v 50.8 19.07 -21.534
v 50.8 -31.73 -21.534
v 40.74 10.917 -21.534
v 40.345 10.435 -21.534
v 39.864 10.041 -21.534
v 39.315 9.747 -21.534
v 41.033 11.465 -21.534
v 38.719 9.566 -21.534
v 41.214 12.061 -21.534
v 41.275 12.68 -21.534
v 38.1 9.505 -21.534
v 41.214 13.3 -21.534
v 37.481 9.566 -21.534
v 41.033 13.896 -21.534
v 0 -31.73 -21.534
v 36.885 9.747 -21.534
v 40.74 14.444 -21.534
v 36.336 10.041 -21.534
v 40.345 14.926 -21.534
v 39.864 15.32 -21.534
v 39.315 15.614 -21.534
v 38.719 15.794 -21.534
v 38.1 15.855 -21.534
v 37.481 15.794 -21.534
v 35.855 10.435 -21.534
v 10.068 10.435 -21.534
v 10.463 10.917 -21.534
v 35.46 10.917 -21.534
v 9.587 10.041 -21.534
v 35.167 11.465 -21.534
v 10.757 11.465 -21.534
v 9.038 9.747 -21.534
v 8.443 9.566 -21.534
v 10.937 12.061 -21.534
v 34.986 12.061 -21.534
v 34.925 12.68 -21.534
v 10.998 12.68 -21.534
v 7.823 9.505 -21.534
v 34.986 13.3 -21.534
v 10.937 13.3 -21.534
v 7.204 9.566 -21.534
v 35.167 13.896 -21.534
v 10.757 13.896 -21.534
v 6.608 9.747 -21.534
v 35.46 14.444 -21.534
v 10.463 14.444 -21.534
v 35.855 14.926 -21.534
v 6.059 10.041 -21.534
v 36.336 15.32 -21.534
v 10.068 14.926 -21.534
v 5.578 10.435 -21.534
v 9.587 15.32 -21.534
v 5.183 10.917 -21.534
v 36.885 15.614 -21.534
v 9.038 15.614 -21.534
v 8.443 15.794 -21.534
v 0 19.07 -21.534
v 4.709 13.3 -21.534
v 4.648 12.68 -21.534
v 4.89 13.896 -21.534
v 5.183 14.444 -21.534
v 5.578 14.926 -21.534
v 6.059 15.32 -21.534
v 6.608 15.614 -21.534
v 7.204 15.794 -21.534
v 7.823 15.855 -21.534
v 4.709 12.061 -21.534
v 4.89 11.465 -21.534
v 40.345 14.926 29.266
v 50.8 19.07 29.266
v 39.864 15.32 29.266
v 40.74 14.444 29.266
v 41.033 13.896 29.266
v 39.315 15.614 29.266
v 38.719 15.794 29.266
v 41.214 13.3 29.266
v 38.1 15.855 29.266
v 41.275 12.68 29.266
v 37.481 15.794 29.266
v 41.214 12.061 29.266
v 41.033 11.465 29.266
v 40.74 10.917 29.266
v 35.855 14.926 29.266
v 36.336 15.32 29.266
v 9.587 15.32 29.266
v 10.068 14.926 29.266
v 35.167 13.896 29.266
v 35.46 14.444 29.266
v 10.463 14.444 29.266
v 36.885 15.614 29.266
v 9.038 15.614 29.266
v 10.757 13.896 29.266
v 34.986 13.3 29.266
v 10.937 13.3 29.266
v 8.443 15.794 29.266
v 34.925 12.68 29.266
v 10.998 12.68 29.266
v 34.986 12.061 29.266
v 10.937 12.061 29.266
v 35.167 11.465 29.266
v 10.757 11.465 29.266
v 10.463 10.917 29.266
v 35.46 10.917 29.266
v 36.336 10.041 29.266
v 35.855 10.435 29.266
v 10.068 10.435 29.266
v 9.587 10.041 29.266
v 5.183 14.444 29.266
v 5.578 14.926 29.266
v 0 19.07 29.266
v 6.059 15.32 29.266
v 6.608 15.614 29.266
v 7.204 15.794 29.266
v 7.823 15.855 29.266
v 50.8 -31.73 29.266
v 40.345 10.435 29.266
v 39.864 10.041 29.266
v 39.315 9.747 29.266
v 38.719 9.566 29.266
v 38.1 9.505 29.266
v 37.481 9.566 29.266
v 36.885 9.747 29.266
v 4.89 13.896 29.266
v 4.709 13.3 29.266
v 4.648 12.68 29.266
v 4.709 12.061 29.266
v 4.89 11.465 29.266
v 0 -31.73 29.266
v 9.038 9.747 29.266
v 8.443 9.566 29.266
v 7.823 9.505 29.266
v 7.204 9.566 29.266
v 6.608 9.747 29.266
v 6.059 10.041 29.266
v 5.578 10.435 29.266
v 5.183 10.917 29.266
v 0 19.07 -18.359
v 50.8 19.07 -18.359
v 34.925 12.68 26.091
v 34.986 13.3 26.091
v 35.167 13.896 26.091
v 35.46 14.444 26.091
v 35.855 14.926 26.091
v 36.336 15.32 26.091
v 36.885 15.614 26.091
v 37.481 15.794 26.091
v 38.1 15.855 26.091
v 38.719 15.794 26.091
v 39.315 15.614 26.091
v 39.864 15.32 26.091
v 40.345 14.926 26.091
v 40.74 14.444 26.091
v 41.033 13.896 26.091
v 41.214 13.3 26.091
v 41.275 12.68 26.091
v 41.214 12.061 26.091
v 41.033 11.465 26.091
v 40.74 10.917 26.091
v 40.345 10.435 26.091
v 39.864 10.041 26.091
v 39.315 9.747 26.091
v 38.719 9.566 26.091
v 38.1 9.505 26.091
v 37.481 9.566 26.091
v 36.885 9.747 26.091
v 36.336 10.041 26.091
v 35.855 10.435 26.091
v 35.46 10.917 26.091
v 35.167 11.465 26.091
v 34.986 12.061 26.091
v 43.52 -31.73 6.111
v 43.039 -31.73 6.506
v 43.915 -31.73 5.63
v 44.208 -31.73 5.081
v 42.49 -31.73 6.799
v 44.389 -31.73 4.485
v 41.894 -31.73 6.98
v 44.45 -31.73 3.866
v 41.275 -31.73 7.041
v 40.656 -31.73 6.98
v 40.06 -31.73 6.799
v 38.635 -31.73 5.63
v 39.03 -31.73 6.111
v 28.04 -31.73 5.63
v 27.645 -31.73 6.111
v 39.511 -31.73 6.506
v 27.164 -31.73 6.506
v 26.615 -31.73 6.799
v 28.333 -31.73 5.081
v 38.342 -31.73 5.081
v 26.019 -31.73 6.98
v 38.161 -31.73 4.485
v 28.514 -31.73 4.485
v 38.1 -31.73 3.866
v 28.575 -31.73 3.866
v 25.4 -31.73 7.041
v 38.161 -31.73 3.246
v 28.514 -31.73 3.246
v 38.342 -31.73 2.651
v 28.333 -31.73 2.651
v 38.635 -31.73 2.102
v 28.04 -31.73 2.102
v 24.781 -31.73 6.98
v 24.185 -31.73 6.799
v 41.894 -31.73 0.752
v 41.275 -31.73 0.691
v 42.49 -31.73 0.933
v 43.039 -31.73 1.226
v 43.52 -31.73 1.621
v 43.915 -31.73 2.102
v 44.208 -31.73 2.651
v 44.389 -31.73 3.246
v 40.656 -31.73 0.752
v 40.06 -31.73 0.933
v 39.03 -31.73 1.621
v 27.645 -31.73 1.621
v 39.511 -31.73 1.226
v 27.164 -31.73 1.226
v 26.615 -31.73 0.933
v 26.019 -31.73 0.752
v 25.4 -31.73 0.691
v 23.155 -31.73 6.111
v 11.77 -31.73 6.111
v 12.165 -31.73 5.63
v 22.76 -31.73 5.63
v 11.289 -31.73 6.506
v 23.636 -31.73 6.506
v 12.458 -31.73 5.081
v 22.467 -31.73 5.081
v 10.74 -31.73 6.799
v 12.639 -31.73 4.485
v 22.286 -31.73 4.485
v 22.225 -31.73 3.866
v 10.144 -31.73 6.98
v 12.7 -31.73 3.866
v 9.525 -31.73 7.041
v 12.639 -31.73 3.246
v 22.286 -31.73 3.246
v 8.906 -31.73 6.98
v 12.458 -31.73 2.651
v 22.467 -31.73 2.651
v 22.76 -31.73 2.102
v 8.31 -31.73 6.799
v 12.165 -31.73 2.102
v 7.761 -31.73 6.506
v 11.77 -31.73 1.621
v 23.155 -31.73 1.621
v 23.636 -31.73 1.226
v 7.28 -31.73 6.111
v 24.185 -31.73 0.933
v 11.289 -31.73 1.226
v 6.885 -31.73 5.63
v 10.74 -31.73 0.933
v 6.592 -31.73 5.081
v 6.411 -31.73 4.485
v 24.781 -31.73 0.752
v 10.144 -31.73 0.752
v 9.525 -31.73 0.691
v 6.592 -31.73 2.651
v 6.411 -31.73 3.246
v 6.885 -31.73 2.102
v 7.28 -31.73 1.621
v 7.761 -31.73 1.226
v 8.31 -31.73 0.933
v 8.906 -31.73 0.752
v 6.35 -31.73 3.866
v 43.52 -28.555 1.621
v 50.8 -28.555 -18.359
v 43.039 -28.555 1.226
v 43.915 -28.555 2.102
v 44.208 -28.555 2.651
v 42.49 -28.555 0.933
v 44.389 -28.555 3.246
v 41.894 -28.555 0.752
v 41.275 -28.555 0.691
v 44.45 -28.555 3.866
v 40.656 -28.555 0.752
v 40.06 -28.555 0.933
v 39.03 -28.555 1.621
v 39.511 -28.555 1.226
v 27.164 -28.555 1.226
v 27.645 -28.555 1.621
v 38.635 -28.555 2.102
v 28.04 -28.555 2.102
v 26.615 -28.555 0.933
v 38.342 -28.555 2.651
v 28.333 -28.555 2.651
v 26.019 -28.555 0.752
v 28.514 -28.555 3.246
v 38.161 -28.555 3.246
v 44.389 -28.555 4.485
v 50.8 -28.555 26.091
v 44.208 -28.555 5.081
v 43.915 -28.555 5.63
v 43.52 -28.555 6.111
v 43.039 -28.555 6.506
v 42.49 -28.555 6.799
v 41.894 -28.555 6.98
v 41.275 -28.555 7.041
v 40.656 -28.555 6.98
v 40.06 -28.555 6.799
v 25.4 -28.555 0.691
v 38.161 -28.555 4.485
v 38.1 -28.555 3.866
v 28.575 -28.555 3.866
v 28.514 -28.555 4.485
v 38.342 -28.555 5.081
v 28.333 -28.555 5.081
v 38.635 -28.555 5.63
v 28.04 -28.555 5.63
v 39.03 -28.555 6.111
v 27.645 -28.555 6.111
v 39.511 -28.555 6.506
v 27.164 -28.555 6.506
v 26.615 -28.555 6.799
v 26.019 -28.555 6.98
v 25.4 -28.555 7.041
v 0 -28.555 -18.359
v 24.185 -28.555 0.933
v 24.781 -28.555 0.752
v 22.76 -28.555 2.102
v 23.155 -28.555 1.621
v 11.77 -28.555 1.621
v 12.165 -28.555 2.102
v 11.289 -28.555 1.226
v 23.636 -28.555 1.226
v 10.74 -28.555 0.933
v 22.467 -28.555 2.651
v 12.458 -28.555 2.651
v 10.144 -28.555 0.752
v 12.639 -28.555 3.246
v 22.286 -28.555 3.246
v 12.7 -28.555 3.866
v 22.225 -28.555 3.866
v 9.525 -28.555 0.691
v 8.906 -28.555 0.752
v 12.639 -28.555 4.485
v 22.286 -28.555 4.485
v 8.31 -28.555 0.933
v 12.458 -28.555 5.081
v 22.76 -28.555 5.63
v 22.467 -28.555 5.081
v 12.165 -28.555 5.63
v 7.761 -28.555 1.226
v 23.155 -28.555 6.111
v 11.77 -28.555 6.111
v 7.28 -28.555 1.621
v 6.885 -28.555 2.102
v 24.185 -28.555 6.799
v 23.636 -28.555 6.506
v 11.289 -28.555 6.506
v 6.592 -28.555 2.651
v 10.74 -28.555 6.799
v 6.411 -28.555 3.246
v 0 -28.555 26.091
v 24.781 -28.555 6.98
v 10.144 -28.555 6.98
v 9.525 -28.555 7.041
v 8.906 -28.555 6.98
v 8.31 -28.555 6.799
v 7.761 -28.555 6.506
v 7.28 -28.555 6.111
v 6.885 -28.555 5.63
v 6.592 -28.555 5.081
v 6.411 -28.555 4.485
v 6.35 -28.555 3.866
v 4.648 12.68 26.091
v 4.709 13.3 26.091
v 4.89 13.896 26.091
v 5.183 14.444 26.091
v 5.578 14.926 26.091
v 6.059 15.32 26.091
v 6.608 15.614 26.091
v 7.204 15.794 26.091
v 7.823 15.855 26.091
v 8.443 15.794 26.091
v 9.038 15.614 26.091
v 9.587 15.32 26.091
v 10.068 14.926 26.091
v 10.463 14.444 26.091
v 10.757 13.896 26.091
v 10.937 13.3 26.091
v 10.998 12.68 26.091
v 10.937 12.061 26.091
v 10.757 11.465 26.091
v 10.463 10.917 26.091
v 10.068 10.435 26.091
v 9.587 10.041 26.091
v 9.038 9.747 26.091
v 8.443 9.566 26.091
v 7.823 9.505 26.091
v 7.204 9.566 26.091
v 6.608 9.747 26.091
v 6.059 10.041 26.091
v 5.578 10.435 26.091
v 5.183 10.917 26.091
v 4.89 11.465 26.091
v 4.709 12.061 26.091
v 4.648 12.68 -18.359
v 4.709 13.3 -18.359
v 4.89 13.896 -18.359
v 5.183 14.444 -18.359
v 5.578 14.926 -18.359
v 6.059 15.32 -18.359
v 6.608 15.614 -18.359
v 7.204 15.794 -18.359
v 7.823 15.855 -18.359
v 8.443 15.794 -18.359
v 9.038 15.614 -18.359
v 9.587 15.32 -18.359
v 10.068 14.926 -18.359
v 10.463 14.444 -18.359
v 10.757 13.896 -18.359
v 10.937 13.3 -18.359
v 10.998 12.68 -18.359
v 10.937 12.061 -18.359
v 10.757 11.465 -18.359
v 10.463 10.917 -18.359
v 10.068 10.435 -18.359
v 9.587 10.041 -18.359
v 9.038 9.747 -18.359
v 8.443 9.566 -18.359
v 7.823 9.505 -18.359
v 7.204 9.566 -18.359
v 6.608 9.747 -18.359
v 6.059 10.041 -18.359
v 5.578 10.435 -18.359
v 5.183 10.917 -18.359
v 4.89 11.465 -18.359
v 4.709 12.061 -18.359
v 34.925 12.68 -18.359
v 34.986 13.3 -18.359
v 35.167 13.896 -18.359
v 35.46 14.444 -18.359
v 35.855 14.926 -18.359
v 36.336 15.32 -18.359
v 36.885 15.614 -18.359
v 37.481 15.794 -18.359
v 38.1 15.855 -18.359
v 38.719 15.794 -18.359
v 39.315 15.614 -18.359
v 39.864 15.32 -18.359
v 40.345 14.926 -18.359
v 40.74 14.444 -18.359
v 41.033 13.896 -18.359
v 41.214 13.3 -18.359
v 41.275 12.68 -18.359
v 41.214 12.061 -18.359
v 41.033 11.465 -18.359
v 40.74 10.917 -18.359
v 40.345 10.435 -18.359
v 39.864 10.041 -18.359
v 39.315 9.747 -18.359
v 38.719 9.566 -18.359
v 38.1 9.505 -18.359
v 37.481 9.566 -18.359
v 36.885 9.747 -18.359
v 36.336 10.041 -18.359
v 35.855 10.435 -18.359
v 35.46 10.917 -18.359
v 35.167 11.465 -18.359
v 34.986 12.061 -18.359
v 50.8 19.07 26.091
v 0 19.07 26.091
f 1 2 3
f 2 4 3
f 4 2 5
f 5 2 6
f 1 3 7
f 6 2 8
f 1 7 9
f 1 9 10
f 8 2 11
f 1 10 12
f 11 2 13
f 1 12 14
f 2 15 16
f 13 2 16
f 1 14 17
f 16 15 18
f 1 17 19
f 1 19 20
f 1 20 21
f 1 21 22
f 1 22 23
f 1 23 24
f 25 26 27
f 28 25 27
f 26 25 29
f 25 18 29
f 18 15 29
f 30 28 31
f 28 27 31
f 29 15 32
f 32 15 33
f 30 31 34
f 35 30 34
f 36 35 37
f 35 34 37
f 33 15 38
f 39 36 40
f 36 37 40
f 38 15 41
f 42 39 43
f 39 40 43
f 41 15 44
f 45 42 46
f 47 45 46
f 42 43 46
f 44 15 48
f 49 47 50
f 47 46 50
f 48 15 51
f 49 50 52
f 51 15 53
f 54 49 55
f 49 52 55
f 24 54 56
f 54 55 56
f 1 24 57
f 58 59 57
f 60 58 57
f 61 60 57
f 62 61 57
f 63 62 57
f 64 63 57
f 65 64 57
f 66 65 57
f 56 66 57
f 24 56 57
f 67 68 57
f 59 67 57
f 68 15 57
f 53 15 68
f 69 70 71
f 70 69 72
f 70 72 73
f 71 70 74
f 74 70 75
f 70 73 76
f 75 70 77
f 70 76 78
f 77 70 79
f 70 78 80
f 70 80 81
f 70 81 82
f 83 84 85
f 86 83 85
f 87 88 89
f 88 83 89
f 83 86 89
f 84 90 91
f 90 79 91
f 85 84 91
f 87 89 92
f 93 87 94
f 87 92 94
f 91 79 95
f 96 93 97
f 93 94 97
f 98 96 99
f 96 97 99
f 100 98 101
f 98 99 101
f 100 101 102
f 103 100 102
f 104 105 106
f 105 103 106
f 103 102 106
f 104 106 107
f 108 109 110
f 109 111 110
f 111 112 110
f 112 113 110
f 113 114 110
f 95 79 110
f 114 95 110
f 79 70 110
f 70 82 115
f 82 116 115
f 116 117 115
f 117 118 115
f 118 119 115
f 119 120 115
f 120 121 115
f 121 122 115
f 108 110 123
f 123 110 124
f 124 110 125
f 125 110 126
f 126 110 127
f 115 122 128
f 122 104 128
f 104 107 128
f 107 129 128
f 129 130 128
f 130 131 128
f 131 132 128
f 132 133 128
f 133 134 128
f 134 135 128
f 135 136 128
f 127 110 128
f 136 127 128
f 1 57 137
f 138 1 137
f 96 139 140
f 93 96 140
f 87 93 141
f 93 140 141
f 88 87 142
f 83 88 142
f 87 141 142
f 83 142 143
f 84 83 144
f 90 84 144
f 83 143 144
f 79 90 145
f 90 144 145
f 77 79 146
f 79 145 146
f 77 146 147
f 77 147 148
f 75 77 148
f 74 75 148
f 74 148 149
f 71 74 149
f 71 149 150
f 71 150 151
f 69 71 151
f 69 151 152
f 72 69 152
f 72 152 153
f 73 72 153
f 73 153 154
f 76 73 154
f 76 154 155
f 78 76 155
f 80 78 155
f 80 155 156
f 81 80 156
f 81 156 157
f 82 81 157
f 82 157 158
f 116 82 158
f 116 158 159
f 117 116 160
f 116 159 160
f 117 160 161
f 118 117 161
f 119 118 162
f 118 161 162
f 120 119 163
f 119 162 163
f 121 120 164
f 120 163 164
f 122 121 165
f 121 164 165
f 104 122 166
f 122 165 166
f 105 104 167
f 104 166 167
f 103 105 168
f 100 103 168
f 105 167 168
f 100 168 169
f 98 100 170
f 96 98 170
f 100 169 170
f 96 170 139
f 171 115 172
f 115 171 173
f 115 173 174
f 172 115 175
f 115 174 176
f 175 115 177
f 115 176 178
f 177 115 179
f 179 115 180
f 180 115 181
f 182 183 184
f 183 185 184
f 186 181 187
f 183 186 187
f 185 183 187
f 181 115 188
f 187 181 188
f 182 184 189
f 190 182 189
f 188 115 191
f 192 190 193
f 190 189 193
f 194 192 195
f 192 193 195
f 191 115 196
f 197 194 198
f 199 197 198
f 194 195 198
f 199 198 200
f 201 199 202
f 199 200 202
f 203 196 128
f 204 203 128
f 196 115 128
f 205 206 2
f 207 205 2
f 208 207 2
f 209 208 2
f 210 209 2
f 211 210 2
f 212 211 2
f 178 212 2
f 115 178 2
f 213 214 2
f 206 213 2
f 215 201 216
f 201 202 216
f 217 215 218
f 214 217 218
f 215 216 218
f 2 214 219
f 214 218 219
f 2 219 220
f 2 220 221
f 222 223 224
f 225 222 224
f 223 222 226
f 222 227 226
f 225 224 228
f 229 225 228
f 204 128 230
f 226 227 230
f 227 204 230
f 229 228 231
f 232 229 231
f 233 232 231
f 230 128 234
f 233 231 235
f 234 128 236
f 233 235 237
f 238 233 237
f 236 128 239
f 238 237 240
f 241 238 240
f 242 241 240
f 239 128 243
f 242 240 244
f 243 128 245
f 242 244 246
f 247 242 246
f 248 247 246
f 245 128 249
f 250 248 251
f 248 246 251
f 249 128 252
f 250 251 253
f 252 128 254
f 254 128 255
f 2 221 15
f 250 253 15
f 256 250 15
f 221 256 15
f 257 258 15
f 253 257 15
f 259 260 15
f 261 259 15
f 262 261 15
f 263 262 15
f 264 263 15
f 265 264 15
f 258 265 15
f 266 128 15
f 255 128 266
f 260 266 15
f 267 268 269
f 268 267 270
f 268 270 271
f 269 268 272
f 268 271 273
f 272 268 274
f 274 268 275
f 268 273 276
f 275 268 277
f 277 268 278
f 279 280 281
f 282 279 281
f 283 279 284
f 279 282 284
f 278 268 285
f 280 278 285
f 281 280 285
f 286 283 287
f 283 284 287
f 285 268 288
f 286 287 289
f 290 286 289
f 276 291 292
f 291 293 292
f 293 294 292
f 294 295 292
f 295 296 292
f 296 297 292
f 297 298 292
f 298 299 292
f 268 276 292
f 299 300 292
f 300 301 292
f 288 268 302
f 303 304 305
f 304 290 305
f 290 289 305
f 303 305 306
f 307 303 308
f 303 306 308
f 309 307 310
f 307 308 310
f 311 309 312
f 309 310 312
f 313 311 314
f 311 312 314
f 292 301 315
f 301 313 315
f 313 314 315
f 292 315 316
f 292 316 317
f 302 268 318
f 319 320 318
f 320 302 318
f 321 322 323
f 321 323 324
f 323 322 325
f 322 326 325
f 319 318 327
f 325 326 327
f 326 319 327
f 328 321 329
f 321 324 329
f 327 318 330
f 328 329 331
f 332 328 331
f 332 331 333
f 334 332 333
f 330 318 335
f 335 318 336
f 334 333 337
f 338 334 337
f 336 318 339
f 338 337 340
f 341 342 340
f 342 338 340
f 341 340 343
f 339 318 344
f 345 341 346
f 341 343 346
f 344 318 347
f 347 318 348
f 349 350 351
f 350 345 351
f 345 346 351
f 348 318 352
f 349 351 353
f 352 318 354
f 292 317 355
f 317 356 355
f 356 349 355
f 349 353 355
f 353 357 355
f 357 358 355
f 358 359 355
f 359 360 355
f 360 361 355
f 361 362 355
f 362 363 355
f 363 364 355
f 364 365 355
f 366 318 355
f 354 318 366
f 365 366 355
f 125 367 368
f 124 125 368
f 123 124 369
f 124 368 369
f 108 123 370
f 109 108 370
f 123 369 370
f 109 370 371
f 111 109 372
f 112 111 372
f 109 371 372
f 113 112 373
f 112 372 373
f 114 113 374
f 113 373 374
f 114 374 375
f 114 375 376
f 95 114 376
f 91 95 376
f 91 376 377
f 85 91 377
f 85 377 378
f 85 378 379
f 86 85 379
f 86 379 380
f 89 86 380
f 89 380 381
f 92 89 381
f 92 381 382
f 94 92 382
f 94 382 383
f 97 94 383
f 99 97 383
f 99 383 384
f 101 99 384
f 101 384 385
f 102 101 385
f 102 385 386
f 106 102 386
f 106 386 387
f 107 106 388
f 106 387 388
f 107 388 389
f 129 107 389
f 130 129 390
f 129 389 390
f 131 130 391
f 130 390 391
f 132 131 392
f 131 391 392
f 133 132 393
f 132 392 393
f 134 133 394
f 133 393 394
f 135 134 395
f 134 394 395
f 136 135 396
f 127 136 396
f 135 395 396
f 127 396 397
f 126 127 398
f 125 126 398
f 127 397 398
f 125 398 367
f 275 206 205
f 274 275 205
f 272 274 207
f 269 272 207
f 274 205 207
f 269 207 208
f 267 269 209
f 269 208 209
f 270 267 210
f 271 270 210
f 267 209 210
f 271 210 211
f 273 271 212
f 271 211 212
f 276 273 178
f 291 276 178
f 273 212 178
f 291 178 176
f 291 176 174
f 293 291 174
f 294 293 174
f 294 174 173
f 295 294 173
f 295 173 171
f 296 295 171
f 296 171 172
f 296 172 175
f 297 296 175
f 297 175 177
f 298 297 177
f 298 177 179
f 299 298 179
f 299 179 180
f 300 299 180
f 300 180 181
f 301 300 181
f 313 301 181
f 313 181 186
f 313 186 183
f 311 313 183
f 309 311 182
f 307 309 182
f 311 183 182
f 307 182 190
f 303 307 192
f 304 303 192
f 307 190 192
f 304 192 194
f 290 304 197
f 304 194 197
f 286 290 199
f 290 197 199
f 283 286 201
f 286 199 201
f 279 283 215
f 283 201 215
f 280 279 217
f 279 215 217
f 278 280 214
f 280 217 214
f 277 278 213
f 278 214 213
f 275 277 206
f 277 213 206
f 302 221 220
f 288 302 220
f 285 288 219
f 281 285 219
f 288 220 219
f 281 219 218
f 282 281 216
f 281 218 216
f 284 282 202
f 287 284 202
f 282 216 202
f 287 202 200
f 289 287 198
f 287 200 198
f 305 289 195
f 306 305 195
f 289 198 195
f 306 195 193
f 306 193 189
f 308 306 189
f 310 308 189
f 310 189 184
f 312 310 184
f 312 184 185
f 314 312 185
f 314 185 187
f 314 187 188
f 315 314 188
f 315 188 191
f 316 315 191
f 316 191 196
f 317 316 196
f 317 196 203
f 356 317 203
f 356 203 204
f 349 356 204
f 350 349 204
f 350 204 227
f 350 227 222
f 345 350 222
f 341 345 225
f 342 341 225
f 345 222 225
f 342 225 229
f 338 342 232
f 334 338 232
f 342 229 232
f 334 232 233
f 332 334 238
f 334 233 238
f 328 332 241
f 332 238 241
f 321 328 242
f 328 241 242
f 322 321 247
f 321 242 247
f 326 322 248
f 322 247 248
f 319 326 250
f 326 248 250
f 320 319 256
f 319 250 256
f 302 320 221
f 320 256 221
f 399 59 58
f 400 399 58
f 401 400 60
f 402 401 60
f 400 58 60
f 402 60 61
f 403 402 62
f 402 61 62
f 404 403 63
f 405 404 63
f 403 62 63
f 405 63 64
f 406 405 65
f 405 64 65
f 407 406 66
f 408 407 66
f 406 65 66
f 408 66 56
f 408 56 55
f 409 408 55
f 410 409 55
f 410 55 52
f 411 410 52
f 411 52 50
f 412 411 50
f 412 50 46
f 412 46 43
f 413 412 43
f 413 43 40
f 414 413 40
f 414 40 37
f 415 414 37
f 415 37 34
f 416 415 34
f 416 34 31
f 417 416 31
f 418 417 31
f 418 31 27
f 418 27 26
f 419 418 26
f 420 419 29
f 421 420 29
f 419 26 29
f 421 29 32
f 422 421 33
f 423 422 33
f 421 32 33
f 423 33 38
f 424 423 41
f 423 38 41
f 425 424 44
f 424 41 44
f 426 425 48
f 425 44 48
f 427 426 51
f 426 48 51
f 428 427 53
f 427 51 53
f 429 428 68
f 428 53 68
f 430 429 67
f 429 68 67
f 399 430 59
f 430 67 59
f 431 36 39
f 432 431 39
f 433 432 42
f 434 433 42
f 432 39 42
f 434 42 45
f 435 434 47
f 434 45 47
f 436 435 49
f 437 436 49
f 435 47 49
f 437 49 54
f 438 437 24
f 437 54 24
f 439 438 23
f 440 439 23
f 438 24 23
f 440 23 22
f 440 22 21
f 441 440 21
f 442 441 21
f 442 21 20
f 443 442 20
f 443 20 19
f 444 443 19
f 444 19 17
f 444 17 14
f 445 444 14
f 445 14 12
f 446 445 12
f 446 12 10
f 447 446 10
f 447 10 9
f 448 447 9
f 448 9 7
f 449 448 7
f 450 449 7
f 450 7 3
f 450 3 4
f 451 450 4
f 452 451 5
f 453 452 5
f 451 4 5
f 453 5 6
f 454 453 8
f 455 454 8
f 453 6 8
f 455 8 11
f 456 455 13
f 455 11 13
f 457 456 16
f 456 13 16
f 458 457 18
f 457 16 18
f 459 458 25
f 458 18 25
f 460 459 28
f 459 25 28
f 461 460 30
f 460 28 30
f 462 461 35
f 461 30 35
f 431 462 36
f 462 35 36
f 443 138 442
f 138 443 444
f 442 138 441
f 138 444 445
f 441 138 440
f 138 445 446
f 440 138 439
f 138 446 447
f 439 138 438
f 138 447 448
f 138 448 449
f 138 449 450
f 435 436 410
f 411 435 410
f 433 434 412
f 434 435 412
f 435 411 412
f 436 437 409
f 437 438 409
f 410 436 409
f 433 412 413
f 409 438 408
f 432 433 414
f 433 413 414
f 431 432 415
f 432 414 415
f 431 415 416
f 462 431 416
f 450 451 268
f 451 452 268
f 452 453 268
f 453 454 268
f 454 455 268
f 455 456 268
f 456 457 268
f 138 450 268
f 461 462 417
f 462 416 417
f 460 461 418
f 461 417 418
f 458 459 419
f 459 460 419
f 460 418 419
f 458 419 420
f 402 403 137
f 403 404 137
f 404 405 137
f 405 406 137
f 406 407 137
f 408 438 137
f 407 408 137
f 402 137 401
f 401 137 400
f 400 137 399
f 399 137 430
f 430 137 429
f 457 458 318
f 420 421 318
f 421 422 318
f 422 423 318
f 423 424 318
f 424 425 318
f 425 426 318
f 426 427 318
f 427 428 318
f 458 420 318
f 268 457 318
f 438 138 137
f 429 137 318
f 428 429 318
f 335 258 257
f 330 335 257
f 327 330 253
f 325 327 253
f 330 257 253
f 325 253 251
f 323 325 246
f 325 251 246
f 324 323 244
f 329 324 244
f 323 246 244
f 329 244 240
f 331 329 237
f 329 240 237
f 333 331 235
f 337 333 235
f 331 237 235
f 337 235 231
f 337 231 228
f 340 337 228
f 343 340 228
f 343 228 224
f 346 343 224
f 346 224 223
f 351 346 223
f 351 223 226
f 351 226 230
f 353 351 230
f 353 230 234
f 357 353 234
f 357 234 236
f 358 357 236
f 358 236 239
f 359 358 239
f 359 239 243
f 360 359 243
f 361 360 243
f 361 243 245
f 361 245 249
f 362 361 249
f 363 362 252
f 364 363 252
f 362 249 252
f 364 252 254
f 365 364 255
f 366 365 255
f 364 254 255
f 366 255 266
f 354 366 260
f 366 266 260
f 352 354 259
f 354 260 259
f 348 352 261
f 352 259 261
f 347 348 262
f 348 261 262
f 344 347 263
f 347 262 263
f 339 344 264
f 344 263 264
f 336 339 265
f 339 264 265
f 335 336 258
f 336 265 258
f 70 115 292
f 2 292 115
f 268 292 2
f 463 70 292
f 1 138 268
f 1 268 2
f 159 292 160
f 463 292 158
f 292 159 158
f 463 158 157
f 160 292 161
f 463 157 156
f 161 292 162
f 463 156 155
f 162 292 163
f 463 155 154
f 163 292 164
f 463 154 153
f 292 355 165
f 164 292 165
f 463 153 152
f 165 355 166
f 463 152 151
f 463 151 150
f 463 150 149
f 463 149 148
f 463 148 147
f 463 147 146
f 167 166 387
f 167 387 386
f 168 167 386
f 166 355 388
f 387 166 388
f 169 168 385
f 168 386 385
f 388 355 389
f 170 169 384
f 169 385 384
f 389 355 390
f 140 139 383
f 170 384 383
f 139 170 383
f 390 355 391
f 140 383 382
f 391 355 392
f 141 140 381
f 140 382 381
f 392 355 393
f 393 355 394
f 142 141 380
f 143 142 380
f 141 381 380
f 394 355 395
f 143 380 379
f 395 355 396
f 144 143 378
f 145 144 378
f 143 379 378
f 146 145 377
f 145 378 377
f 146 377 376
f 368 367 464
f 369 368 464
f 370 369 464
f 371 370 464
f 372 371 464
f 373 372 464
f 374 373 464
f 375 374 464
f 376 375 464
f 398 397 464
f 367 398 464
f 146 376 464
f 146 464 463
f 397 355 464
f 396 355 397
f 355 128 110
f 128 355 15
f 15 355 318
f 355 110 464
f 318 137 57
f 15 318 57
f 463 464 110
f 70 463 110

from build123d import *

# Parameters (mm, degrees)
BOSS_EXTRUDE1_DEPTH = 50.8
SKETCH2_R           = 3.175
CUT_EXTRUDE1_DEPTH  = 50.8
SKETCH6_R           = 3.175
CUT_EXTRUDE2_DEPTH  = 50.8


with BuildPart() as part:
    # Sketch1 → Boss-Extrude1 (new body)
    with BuildSketch(Plane(origin=(0, 0, 0), x_dir=(0, 0, -1), z_dir=(1, 0, 0))):
        Polygon((-29.265887299, 19.069791765), (-29.265887299, -31.730208235), (21.534112701, -31.730208235), (21.534112701, 19.069791765), (18.359112701, 19.069791765), (18.359112701, -28.555208235), (-26.090887299, -28.555208235), (-26.090887299, 19.069791765), align=None)
    extrude(amount=BOSS_EXTRUDE1_DEPTH)

    # Sketch2 → Cut-Extrude1 (cut)
    with BuildSketch(Plane(origin=(0, 0, -21.534112701), x_dir=(-1, 0, 0), z_dir=(0, 0, -1))):
        with Locations((-38.1, 12.680491765)):
            Circle(SKETCH2_R)
        with Locations((-7.8232, 12.680491765)):
            Circle(SKETCH2_R)
    extrude(amount=-CUT_EXTRUDE1_DEPTH, mode=Mode.SUBTRACT)

    # Sketch6 → Cut-Extrude2 (cut)
    with BuildSketch(Plane.XZ.offset(31.730208235)):
        with Locations(Location((41.275, 3.865887299, 0), (0, 0, 270))):
            Circle(SKETCH6_R)
        with Locations(Location((25.4, 3.865887299, 0), (0, 0, 270))):
            Circle(SKETCH6_R)
        with Locations(Location((9.525, 3.865887299, 0), (0, 0, 270))):
            Circle(SKETCH6_R)
    extrude(amount=-CUT_EXTRUDE2_DEPTH, mode=Mode.SUBTRACT)


solid = part.part
